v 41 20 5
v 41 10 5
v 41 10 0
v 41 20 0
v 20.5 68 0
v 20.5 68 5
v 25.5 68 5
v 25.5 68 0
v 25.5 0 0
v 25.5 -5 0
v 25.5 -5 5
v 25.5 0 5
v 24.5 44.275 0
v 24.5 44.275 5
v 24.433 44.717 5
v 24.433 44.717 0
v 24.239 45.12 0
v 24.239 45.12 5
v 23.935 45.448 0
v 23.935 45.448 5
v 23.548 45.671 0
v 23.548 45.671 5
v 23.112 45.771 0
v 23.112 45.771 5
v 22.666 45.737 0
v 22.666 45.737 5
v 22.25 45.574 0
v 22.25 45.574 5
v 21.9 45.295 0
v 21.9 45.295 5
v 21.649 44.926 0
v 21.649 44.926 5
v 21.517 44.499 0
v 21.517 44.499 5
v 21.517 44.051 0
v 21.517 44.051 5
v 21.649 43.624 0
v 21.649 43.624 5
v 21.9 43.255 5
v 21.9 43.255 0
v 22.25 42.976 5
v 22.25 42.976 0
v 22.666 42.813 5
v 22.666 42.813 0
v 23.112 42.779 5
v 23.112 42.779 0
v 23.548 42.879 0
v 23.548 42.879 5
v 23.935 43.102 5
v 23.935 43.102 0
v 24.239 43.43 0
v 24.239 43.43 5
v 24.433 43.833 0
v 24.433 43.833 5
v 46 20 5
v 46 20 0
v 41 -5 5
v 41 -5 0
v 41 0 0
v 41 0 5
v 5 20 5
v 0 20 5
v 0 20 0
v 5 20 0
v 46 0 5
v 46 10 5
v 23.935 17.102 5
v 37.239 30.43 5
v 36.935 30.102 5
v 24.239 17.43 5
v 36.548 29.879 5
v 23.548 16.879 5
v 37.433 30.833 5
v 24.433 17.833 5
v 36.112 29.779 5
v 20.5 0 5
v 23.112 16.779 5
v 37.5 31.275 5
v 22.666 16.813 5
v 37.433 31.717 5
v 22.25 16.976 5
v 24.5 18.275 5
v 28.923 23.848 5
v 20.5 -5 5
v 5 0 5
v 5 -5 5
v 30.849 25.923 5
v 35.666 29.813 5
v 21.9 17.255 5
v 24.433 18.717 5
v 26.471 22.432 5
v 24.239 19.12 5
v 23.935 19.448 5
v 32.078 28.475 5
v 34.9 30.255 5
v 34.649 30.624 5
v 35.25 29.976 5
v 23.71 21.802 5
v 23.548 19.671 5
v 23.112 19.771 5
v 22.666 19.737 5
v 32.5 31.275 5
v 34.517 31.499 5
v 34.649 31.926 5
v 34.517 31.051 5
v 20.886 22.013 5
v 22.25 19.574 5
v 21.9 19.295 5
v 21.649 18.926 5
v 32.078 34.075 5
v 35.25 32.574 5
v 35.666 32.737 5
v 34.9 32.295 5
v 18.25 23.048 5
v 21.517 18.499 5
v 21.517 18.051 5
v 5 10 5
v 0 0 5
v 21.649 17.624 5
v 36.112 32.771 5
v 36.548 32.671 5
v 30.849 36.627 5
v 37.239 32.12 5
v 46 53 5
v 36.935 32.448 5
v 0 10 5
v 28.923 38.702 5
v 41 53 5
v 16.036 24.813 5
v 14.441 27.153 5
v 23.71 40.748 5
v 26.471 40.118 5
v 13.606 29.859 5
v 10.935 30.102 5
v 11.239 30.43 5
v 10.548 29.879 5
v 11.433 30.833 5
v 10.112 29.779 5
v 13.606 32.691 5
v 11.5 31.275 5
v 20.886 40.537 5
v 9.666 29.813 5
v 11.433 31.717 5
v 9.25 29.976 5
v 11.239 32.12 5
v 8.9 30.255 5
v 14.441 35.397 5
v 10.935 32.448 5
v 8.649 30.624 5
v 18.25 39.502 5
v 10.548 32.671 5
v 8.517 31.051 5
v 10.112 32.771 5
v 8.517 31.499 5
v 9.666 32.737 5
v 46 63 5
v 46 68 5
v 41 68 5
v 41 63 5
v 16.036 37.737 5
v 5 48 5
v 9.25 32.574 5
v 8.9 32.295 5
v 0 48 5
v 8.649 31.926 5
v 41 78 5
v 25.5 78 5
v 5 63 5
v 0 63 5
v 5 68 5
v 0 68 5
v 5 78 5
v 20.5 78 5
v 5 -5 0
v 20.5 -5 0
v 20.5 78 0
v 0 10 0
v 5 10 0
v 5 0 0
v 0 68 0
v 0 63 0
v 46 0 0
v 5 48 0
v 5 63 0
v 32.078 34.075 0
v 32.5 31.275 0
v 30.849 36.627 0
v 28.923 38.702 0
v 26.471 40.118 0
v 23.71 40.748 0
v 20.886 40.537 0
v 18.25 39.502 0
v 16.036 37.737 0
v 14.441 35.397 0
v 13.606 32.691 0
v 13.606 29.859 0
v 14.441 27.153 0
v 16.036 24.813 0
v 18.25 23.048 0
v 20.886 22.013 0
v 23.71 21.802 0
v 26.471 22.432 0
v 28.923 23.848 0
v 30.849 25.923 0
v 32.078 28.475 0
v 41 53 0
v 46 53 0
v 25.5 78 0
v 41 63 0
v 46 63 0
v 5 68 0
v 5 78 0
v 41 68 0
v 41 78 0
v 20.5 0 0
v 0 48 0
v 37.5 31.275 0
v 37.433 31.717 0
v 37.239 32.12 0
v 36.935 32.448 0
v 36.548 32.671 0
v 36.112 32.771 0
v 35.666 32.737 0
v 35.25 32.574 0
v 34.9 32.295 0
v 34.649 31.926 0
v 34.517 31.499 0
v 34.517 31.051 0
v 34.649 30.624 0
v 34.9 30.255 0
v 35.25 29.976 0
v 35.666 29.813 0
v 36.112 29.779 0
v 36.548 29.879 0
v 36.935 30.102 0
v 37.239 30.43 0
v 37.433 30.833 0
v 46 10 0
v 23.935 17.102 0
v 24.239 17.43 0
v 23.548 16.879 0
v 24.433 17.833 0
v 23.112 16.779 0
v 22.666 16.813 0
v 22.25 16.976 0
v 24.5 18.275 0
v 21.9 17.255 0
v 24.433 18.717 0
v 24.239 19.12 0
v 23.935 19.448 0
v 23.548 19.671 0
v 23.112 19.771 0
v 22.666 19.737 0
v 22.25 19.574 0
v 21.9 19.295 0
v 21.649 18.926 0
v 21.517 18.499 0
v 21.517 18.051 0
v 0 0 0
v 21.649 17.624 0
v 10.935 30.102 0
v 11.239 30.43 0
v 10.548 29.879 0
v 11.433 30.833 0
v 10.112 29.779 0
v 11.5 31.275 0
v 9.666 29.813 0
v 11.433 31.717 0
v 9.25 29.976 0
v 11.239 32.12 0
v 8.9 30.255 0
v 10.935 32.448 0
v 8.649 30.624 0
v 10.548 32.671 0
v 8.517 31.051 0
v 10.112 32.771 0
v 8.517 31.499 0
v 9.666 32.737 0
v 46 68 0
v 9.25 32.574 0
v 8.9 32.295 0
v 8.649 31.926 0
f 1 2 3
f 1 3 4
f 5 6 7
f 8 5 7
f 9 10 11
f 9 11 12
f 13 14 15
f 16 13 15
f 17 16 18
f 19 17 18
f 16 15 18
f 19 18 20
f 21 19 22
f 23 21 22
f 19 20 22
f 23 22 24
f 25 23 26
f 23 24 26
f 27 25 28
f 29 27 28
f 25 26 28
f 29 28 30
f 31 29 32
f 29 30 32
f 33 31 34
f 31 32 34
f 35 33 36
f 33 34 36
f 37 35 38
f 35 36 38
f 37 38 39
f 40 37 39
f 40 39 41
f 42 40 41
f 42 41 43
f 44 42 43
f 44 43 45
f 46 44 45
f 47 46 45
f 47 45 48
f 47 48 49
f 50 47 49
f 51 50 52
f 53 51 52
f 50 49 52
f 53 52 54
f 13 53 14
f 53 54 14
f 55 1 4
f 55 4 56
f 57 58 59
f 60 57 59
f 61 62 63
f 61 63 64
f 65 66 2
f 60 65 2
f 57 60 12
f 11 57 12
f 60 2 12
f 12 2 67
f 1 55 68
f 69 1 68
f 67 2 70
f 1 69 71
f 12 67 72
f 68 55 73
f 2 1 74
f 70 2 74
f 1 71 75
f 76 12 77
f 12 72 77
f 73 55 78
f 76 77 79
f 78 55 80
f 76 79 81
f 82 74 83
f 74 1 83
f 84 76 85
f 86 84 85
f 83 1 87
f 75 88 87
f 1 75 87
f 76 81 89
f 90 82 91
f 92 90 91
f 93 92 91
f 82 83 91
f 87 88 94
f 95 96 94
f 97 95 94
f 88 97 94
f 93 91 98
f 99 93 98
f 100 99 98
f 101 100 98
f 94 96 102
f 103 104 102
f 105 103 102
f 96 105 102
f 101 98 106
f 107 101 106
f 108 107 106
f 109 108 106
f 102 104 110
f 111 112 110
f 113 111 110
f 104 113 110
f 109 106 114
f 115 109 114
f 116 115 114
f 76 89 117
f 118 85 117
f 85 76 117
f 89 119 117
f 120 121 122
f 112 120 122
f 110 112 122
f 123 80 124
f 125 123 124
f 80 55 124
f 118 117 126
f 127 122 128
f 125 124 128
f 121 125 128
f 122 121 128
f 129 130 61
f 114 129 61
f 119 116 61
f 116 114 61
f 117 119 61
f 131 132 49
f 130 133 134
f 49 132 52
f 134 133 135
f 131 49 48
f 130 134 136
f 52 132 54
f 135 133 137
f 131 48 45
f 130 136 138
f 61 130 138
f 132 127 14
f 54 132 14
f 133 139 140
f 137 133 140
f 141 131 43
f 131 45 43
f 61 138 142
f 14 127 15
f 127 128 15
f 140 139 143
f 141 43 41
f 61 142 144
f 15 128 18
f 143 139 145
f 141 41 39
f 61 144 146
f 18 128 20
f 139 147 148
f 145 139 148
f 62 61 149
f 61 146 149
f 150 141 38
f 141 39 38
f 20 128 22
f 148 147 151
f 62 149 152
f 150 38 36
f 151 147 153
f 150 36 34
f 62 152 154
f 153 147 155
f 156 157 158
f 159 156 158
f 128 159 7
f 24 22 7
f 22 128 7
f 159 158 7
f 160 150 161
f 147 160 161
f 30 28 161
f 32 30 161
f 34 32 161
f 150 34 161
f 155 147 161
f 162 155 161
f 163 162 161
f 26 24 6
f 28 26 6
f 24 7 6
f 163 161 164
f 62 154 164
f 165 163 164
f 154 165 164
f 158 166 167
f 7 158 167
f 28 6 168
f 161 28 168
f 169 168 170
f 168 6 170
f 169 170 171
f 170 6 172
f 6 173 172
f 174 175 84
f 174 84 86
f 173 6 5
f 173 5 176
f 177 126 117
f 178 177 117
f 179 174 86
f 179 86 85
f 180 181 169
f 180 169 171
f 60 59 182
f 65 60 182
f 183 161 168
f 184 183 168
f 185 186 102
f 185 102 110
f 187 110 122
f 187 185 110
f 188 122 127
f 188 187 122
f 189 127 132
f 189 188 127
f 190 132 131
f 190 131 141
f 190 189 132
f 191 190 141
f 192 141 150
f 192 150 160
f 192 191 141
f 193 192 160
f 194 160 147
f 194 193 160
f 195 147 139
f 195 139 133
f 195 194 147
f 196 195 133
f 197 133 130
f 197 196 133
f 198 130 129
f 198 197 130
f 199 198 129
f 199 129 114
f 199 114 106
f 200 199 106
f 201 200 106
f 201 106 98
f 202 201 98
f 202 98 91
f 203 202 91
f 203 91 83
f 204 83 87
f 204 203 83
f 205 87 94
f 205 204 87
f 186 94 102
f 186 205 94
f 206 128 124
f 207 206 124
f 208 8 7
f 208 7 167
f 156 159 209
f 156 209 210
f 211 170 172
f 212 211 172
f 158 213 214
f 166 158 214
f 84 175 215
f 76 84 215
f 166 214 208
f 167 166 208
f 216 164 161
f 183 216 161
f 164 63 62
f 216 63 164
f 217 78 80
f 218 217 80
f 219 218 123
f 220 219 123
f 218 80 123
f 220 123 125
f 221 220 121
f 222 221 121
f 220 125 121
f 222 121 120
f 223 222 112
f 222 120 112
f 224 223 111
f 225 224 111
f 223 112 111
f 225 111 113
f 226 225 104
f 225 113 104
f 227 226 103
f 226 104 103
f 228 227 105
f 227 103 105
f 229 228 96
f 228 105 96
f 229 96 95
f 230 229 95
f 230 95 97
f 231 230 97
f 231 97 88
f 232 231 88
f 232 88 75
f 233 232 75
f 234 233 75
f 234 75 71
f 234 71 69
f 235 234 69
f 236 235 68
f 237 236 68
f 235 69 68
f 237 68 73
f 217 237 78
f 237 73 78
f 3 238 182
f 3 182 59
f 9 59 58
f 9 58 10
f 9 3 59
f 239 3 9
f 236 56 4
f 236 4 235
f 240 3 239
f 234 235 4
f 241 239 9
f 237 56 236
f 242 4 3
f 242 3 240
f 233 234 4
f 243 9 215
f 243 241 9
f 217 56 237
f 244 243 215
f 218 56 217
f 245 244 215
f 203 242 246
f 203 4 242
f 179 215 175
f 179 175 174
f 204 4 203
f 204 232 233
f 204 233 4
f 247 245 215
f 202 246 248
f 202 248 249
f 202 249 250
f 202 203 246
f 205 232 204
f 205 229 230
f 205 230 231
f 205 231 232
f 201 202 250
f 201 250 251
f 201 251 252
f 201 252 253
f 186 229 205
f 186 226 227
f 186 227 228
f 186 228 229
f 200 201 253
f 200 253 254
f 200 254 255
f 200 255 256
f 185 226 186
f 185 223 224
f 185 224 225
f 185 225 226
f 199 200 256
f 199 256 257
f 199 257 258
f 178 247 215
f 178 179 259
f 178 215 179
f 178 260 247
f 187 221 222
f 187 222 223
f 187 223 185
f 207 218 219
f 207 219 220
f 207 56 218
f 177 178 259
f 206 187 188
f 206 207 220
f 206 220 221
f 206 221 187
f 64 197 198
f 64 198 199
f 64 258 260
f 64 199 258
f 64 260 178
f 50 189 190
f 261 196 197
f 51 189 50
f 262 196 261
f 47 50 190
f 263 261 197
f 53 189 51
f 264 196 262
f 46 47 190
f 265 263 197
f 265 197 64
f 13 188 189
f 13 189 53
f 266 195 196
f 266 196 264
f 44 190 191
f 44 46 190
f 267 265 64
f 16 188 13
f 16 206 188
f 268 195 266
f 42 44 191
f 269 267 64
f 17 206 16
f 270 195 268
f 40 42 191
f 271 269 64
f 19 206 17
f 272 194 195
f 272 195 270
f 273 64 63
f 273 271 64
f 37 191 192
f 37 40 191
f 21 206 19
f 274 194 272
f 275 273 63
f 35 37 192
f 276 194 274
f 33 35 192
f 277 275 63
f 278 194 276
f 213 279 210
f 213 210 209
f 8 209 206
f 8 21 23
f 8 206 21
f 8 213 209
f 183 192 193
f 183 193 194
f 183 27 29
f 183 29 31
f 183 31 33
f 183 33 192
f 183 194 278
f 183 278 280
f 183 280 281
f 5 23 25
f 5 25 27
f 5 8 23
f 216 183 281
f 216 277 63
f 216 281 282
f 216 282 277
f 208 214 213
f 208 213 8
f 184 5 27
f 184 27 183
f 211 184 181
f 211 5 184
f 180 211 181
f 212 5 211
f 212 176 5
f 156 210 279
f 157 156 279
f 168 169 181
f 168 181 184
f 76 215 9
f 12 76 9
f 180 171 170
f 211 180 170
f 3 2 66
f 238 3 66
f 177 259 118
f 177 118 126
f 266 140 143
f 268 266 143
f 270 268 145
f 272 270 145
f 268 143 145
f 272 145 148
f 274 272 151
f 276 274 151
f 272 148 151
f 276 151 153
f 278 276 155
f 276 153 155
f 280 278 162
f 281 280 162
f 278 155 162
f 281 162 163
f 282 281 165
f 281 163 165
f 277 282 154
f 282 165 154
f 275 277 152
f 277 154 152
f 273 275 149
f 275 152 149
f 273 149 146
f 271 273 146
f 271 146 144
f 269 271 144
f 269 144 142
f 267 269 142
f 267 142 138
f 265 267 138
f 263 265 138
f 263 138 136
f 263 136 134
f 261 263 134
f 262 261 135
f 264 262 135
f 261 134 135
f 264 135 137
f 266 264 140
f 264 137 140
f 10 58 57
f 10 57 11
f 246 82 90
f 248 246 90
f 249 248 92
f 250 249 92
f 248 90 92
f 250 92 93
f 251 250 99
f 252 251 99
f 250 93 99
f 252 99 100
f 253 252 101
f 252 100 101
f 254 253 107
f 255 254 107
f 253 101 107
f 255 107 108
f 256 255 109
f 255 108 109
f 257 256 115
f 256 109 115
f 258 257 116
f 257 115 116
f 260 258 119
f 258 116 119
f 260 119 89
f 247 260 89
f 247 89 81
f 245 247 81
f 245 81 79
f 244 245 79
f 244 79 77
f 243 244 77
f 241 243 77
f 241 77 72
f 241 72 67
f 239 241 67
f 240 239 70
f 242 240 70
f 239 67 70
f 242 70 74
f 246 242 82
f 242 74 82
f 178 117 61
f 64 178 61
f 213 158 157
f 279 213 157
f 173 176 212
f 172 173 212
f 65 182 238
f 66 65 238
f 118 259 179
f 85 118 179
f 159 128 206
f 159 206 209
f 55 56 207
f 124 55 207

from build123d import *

# Parameters (mm, degrees)
ESQUISSE1_W             = 46
ESQUISSE1_H             = 73
ESQUISSE1_R             = 9.5
BOSS_EXTRU_1_DEPTH      = 5
ESQUISSE2_R             = 1.5
ESQUISSE2_W             = 5
ESQUISSE2_H             = 10
ESQUISSE2_H_2           = 5
ESQUISSE2_H_3           = 15
ENL_V_MAT_EXTRU_1_DEPTH = 5
ESQUISSE3_W             = 15.5
ESQUISSE3_H             = 5
BOSS_EXTRU_2_DEPTH      = 5


with BuildPart() as part:
    # Esquisse1 → Boss.-Extru.1 (new body)
    with BuildSketch(Plane.XY):
        with Locations((23, 36.5)):
            Rectangle(ESQUISSE1_W, ESQUISSE1_H)
        with Locations((23, 31.275)):
            Circle(ESQUISSE1_R, mode=Mode.SUBTRACT)
    extrude(amount=BOSS_EXTRU_1_DEPTH)

    # Esquisse2 → Enlèv. mat.-Extru.1 (cut)
    with BuildSketch(Plane.XY.offset(5)):
        with Locations((23, 44.275)):
            Circle(ESQUISSE2_R)
        with Locations((36, 31.275)):
            Circle(ESQUISSE2_R)
        with Locations((23, 18.275)):
            Circle(ESQUISSE2_R)
        with Locations((10, 31.275)):
            Circle(ESQUISSE2_R)
        with Locations((43.5, 58)):
            Rectangle(ESQUISSE2_W, ESQUISSE2_H)
        with Locations((2.5, 70.5)):
            Rectangle(ESQUISSE2_W, ESQUISSE2_H_2)
        with Locations((43.5, 15)):
            Rectangle(ESQUISSE2_W, ESQUISSE2_H)
        with Locations((2.5, 15)):
            Rectangle(ESQUISSE2_W, ESQUISSE2_H)
        with Locations((2.5, 55.5)):
            Rectangle(ESQUISSE2_W, ESQUISSE2_H_3)
        with Locations((43.5, 70.5)):
            Rectangle(ESQUISSE2_W, ESQUISSE2_H_2)
        with Locations((23, 70.5)):
            Rectangle(ESQUISSE2_W, ESQUISSE2_H_2)
    extrude(amount=-ENL_V_MAT_EXTRU_1_DEPTH, mode=Mode.SUBTRACT)

    # Esquisse3 → Boss.-Extru.2 (add)
    with BuildSketch(Plane(origin=(0, 0, 0), x_dir=(-1, 0, 0), z_dir=(0, 0, -1))):
        with Locations((-33.25, 75.5)):
            Rectangle(ESQUISSE3_W, ESQUISSE3_H)
        with Locations((-12.75, 75.5)):
            Rectangle(ESQUISSE3_W, ESQUISSE3_H)
        with Locations((-33.25, -2.5)):
            Rectangle(ESQUISSE3_W, ESQUISSE3_H)
        with Locations((-12.75, -2.5)):
            Rectangle(ESQUISSE3_W, ESQUISSE3_H)
    extrude(amount=-BOSS_EXTRU_2_DEPTH)


solid = part.part
